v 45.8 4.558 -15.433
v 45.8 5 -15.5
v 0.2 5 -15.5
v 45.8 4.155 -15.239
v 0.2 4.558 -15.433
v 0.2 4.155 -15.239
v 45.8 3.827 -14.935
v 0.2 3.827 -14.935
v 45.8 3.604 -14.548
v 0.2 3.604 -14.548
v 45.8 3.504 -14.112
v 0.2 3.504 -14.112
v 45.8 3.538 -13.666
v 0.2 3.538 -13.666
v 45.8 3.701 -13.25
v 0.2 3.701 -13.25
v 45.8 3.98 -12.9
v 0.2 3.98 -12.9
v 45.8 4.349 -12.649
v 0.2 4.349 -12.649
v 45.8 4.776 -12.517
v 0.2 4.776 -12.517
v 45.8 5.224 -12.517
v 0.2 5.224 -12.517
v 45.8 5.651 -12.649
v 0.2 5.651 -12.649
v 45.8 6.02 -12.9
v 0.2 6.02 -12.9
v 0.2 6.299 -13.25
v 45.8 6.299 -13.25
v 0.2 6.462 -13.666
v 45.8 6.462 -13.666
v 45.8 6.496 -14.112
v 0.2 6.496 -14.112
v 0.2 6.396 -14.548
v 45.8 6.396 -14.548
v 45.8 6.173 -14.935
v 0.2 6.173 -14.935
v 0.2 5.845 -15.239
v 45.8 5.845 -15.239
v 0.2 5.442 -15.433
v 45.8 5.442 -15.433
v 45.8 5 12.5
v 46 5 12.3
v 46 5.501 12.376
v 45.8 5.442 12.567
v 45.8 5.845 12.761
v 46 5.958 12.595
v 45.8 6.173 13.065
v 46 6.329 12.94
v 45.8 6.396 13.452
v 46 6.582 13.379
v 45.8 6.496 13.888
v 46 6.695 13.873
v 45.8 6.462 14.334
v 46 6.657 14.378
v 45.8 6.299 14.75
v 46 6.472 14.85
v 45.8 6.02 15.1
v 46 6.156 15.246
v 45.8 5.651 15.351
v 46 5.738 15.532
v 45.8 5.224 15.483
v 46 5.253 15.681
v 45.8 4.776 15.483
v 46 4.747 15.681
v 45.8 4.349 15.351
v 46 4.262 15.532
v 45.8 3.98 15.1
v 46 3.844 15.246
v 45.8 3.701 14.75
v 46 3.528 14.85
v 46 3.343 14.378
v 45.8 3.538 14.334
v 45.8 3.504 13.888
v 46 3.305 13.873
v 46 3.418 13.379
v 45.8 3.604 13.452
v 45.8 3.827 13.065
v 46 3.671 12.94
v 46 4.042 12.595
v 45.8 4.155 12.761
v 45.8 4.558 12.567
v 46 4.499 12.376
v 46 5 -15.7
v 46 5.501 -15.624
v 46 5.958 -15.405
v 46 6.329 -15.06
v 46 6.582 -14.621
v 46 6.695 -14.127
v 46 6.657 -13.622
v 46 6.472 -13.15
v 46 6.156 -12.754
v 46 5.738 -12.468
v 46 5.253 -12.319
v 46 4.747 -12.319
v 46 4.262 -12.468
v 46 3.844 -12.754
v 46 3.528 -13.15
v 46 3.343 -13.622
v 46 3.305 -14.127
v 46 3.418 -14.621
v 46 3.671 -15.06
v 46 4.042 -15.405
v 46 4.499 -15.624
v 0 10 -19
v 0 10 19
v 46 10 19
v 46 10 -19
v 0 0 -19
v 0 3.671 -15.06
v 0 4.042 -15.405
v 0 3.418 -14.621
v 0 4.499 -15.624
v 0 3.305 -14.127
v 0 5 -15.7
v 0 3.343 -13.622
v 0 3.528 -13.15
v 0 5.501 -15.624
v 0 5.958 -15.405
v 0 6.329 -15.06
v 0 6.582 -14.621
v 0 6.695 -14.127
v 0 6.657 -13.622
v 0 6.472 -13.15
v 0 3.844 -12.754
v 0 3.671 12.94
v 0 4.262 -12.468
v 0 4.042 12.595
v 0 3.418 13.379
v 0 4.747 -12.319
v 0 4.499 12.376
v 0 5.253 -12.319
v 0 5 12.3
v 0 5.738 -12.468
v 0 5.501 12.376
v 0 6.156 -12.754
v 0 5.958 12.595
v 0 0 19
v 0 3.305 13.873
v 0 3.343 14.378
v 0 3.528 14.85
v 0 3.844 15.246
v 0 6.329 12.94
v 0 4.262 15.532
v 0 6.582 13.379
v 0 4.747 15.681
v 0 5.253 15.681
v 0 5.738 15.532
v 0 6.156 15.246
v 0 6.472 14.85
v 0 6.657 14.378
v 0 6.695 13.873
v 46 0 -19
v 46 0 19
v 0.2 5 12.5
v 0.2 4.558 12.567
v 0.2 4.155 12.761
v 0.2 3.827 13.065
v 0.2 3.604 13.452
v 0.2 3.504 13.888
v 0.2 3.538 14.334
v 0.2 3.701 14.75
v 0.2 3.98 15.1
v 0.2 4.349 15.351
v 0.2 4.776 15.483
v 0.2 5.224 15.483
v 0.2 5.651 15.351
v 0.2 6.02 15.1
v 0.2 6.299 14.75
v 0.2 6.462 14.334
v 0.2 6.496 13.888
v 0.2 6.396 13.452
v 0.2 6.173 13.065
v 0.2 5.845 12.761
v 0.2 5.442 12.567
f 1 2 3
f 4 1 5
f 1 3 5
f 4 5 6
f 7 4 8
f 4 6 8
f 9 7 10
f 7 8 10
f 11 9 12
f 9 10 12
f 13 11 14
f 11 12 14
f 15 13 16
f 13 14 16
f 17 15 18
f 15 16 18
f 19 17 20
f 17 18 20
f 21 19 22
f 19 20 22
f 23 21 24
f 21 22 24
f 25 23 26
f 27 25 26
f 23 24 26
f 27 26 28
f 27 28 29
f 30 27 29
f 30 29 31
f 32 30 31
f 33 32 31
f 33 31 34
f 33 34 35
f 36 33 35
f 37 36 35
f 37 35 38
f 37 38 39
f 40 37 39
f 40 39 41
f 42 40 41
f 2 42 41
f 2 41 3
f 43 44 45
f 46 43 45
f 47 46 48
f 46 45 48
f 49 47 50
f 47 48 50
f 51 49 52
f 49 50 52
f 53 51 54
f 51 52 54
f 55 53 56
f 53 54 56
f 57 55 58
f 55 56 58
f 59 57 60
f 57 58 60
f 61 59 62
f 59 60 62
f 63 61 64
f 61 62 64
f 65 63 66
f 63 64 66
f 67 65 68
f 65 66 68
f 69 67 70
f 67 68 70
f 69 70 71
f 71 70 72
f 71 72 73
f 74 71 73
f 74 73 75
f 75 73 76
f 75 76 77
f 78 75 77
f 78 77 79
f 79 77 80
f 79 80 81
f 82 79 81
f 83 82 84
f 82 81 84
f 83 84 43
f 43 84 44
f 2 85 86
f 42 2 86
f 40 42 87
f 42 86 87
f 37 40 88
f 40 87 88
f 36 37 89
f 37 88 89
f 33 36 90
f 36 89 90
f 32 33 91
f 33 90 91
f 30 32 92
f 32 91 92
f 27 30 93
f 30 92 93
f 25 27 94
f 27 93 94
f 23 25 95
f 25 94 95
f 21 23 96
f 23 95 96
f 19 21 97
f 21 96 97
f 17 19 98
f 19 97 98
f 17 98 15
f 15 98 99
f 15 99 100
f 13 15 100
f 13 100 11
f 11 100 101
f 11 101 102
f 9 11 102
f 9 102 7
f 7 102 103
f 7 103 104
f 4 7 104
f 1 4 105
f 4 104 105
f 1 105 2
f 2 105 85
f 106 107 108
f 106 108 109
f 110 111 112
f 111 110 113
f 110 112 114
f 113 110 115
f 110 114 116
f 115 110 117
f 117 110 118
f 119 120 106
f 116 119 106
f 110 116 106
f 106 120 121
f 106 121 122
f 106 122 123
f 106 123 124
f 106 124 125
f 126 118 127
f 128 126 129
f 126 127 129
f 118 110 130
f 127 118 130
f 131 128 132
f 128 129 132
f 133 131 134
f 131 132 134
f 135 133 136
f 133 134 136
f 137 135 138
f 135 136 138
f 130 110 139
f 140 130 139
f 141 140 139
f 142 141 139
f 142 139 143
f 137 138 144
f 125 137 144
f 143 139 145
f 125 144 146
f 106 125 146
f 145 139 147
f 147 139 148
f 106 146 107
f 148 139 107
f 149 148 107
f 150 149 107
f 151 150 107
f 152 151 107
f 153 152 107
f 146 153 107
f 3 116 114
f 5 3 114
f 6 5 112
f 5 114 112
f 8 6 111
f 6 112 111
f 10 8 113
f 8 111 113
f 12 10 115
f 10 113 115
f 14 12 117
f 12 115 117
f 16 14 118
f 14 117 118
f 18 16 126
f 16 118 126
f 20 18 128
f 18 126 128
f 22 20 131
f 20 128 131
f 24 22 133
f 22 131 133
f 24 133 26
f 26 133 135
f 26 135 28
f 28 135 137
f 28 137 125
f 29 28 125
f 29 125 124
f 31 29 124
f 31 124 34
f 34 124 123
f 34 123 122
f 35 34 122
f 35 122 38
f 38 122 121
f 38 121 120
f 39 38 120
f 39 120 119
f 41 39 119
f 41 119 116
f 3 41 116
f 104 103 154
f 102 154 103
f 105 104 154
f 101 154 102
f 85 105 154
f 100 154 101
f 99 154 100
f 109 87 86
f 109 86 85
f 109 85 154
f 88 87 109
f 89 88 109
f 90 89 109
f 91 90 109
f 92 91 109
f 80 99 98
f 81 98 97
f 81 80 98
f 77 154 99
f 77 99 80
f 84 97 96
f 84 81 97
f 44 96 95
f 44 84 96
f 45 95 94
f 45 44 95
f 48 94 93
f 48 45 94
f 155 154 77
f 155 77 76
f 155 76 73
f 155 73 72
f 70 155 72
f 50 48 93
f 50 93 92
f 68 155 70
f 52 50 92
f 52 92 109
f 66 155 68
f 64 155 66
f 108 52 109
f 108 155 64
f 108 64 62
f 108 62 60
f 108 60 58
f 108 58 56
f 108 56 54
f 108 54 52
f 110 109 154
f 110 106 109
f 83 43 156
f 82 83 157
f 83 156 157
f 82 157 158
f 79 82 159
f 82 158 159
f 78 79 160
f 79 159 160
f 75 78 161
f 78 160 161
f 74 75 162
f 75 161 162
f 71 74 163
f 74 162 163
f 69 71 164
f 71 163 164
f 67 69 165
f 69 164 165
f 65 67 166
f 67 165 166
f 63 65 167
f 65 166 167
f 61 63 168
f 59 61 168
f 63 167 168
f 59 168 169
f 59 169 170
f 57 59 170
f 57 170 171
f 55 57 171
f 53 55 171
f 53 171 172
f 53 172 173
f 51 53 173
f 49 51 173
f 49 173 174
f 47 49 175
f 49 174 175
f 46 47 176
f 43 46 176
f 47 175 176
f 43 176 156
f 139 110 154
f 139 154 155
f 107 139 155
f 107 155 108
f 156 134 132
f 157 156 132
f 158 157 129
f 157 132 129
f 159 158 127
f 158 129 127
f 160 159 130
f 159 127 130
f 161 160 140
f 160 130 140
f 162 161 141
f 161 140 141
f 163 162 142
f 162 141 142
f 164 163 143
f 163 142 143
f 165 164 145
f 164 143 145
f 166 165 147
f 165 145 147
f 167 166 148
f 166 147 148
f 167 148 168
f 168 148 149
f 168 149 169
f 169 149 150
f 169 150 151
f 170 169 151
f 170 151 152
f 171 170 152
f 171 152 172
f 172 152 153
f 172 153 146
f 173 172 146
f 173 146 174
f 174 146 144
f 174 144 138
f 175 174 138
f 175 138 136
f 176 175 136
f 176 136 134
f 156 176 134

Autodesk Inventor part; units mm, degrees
ref_plane "YZ Plane" through (0, 0, 0) normal (1, 0, 0) x (0, 1, 0)
ref_plane "XZ Plane" through (0, 0, 0) normal (0, 1, 0) x (-1, 0, 0)
ref_plane "XY Plane" through (0, 0, 0) normal (0, 0, 1) x (1, 0, 0)
sketch "Эскиз1" plane through (0, 0, 0) normal (1, 0, 0) x (0, 1, 0)
  line L0 (0, 19) -> (10, 19)
  line L1 (10, 19) -> (10, -19)
  line L2 (10, -19) -> (0, -19)
  line L3 (0, -19) -> (0, 19)
  line L4 (-2, 0) -> (12, 0) construction
  line L5 (0, -26.6) -> (0, 26.6) construction
  point P0 (0, 0)
  dimension "d0" = 10
  dimension "d1" = 38
extrude "Выдавливание1" add sketch "Эскиз1" along normal blind 46
sketch "Эскиз2" plane through (46, 0, 0) normal (1, 0, 0) x (0, 0, -1)
  line L0 (19, 10) -> (-19, 10) projected
  line L1 (-19, 10) -> (-19, 0) projected
  line L2 (19, 0) -> (19, 10) projected
  line L3 (0, -2) -> (0, 12) construction
  point P0 (0, 0)
  point P1 (-14, 5)
  point P2 (14, 5)
  dimension "d4" = 5
  dimension "d5" = 5
  dimension "d6" = 5
hole "Отверстие1" at (46, 5, 14) at (46, 5, -14) direction (-1, 0, 0) diameter 3 depth 60
chamfer "Фаска1" distance 0.2 angle 45 4 edges at (46, 5, -12.5) (46, 5, 15.5) (0, 5, -12.5) (0, 5, 15.5)
equation "\"d6\" = d5"
properties part number "Стенкка для ковнейера"
